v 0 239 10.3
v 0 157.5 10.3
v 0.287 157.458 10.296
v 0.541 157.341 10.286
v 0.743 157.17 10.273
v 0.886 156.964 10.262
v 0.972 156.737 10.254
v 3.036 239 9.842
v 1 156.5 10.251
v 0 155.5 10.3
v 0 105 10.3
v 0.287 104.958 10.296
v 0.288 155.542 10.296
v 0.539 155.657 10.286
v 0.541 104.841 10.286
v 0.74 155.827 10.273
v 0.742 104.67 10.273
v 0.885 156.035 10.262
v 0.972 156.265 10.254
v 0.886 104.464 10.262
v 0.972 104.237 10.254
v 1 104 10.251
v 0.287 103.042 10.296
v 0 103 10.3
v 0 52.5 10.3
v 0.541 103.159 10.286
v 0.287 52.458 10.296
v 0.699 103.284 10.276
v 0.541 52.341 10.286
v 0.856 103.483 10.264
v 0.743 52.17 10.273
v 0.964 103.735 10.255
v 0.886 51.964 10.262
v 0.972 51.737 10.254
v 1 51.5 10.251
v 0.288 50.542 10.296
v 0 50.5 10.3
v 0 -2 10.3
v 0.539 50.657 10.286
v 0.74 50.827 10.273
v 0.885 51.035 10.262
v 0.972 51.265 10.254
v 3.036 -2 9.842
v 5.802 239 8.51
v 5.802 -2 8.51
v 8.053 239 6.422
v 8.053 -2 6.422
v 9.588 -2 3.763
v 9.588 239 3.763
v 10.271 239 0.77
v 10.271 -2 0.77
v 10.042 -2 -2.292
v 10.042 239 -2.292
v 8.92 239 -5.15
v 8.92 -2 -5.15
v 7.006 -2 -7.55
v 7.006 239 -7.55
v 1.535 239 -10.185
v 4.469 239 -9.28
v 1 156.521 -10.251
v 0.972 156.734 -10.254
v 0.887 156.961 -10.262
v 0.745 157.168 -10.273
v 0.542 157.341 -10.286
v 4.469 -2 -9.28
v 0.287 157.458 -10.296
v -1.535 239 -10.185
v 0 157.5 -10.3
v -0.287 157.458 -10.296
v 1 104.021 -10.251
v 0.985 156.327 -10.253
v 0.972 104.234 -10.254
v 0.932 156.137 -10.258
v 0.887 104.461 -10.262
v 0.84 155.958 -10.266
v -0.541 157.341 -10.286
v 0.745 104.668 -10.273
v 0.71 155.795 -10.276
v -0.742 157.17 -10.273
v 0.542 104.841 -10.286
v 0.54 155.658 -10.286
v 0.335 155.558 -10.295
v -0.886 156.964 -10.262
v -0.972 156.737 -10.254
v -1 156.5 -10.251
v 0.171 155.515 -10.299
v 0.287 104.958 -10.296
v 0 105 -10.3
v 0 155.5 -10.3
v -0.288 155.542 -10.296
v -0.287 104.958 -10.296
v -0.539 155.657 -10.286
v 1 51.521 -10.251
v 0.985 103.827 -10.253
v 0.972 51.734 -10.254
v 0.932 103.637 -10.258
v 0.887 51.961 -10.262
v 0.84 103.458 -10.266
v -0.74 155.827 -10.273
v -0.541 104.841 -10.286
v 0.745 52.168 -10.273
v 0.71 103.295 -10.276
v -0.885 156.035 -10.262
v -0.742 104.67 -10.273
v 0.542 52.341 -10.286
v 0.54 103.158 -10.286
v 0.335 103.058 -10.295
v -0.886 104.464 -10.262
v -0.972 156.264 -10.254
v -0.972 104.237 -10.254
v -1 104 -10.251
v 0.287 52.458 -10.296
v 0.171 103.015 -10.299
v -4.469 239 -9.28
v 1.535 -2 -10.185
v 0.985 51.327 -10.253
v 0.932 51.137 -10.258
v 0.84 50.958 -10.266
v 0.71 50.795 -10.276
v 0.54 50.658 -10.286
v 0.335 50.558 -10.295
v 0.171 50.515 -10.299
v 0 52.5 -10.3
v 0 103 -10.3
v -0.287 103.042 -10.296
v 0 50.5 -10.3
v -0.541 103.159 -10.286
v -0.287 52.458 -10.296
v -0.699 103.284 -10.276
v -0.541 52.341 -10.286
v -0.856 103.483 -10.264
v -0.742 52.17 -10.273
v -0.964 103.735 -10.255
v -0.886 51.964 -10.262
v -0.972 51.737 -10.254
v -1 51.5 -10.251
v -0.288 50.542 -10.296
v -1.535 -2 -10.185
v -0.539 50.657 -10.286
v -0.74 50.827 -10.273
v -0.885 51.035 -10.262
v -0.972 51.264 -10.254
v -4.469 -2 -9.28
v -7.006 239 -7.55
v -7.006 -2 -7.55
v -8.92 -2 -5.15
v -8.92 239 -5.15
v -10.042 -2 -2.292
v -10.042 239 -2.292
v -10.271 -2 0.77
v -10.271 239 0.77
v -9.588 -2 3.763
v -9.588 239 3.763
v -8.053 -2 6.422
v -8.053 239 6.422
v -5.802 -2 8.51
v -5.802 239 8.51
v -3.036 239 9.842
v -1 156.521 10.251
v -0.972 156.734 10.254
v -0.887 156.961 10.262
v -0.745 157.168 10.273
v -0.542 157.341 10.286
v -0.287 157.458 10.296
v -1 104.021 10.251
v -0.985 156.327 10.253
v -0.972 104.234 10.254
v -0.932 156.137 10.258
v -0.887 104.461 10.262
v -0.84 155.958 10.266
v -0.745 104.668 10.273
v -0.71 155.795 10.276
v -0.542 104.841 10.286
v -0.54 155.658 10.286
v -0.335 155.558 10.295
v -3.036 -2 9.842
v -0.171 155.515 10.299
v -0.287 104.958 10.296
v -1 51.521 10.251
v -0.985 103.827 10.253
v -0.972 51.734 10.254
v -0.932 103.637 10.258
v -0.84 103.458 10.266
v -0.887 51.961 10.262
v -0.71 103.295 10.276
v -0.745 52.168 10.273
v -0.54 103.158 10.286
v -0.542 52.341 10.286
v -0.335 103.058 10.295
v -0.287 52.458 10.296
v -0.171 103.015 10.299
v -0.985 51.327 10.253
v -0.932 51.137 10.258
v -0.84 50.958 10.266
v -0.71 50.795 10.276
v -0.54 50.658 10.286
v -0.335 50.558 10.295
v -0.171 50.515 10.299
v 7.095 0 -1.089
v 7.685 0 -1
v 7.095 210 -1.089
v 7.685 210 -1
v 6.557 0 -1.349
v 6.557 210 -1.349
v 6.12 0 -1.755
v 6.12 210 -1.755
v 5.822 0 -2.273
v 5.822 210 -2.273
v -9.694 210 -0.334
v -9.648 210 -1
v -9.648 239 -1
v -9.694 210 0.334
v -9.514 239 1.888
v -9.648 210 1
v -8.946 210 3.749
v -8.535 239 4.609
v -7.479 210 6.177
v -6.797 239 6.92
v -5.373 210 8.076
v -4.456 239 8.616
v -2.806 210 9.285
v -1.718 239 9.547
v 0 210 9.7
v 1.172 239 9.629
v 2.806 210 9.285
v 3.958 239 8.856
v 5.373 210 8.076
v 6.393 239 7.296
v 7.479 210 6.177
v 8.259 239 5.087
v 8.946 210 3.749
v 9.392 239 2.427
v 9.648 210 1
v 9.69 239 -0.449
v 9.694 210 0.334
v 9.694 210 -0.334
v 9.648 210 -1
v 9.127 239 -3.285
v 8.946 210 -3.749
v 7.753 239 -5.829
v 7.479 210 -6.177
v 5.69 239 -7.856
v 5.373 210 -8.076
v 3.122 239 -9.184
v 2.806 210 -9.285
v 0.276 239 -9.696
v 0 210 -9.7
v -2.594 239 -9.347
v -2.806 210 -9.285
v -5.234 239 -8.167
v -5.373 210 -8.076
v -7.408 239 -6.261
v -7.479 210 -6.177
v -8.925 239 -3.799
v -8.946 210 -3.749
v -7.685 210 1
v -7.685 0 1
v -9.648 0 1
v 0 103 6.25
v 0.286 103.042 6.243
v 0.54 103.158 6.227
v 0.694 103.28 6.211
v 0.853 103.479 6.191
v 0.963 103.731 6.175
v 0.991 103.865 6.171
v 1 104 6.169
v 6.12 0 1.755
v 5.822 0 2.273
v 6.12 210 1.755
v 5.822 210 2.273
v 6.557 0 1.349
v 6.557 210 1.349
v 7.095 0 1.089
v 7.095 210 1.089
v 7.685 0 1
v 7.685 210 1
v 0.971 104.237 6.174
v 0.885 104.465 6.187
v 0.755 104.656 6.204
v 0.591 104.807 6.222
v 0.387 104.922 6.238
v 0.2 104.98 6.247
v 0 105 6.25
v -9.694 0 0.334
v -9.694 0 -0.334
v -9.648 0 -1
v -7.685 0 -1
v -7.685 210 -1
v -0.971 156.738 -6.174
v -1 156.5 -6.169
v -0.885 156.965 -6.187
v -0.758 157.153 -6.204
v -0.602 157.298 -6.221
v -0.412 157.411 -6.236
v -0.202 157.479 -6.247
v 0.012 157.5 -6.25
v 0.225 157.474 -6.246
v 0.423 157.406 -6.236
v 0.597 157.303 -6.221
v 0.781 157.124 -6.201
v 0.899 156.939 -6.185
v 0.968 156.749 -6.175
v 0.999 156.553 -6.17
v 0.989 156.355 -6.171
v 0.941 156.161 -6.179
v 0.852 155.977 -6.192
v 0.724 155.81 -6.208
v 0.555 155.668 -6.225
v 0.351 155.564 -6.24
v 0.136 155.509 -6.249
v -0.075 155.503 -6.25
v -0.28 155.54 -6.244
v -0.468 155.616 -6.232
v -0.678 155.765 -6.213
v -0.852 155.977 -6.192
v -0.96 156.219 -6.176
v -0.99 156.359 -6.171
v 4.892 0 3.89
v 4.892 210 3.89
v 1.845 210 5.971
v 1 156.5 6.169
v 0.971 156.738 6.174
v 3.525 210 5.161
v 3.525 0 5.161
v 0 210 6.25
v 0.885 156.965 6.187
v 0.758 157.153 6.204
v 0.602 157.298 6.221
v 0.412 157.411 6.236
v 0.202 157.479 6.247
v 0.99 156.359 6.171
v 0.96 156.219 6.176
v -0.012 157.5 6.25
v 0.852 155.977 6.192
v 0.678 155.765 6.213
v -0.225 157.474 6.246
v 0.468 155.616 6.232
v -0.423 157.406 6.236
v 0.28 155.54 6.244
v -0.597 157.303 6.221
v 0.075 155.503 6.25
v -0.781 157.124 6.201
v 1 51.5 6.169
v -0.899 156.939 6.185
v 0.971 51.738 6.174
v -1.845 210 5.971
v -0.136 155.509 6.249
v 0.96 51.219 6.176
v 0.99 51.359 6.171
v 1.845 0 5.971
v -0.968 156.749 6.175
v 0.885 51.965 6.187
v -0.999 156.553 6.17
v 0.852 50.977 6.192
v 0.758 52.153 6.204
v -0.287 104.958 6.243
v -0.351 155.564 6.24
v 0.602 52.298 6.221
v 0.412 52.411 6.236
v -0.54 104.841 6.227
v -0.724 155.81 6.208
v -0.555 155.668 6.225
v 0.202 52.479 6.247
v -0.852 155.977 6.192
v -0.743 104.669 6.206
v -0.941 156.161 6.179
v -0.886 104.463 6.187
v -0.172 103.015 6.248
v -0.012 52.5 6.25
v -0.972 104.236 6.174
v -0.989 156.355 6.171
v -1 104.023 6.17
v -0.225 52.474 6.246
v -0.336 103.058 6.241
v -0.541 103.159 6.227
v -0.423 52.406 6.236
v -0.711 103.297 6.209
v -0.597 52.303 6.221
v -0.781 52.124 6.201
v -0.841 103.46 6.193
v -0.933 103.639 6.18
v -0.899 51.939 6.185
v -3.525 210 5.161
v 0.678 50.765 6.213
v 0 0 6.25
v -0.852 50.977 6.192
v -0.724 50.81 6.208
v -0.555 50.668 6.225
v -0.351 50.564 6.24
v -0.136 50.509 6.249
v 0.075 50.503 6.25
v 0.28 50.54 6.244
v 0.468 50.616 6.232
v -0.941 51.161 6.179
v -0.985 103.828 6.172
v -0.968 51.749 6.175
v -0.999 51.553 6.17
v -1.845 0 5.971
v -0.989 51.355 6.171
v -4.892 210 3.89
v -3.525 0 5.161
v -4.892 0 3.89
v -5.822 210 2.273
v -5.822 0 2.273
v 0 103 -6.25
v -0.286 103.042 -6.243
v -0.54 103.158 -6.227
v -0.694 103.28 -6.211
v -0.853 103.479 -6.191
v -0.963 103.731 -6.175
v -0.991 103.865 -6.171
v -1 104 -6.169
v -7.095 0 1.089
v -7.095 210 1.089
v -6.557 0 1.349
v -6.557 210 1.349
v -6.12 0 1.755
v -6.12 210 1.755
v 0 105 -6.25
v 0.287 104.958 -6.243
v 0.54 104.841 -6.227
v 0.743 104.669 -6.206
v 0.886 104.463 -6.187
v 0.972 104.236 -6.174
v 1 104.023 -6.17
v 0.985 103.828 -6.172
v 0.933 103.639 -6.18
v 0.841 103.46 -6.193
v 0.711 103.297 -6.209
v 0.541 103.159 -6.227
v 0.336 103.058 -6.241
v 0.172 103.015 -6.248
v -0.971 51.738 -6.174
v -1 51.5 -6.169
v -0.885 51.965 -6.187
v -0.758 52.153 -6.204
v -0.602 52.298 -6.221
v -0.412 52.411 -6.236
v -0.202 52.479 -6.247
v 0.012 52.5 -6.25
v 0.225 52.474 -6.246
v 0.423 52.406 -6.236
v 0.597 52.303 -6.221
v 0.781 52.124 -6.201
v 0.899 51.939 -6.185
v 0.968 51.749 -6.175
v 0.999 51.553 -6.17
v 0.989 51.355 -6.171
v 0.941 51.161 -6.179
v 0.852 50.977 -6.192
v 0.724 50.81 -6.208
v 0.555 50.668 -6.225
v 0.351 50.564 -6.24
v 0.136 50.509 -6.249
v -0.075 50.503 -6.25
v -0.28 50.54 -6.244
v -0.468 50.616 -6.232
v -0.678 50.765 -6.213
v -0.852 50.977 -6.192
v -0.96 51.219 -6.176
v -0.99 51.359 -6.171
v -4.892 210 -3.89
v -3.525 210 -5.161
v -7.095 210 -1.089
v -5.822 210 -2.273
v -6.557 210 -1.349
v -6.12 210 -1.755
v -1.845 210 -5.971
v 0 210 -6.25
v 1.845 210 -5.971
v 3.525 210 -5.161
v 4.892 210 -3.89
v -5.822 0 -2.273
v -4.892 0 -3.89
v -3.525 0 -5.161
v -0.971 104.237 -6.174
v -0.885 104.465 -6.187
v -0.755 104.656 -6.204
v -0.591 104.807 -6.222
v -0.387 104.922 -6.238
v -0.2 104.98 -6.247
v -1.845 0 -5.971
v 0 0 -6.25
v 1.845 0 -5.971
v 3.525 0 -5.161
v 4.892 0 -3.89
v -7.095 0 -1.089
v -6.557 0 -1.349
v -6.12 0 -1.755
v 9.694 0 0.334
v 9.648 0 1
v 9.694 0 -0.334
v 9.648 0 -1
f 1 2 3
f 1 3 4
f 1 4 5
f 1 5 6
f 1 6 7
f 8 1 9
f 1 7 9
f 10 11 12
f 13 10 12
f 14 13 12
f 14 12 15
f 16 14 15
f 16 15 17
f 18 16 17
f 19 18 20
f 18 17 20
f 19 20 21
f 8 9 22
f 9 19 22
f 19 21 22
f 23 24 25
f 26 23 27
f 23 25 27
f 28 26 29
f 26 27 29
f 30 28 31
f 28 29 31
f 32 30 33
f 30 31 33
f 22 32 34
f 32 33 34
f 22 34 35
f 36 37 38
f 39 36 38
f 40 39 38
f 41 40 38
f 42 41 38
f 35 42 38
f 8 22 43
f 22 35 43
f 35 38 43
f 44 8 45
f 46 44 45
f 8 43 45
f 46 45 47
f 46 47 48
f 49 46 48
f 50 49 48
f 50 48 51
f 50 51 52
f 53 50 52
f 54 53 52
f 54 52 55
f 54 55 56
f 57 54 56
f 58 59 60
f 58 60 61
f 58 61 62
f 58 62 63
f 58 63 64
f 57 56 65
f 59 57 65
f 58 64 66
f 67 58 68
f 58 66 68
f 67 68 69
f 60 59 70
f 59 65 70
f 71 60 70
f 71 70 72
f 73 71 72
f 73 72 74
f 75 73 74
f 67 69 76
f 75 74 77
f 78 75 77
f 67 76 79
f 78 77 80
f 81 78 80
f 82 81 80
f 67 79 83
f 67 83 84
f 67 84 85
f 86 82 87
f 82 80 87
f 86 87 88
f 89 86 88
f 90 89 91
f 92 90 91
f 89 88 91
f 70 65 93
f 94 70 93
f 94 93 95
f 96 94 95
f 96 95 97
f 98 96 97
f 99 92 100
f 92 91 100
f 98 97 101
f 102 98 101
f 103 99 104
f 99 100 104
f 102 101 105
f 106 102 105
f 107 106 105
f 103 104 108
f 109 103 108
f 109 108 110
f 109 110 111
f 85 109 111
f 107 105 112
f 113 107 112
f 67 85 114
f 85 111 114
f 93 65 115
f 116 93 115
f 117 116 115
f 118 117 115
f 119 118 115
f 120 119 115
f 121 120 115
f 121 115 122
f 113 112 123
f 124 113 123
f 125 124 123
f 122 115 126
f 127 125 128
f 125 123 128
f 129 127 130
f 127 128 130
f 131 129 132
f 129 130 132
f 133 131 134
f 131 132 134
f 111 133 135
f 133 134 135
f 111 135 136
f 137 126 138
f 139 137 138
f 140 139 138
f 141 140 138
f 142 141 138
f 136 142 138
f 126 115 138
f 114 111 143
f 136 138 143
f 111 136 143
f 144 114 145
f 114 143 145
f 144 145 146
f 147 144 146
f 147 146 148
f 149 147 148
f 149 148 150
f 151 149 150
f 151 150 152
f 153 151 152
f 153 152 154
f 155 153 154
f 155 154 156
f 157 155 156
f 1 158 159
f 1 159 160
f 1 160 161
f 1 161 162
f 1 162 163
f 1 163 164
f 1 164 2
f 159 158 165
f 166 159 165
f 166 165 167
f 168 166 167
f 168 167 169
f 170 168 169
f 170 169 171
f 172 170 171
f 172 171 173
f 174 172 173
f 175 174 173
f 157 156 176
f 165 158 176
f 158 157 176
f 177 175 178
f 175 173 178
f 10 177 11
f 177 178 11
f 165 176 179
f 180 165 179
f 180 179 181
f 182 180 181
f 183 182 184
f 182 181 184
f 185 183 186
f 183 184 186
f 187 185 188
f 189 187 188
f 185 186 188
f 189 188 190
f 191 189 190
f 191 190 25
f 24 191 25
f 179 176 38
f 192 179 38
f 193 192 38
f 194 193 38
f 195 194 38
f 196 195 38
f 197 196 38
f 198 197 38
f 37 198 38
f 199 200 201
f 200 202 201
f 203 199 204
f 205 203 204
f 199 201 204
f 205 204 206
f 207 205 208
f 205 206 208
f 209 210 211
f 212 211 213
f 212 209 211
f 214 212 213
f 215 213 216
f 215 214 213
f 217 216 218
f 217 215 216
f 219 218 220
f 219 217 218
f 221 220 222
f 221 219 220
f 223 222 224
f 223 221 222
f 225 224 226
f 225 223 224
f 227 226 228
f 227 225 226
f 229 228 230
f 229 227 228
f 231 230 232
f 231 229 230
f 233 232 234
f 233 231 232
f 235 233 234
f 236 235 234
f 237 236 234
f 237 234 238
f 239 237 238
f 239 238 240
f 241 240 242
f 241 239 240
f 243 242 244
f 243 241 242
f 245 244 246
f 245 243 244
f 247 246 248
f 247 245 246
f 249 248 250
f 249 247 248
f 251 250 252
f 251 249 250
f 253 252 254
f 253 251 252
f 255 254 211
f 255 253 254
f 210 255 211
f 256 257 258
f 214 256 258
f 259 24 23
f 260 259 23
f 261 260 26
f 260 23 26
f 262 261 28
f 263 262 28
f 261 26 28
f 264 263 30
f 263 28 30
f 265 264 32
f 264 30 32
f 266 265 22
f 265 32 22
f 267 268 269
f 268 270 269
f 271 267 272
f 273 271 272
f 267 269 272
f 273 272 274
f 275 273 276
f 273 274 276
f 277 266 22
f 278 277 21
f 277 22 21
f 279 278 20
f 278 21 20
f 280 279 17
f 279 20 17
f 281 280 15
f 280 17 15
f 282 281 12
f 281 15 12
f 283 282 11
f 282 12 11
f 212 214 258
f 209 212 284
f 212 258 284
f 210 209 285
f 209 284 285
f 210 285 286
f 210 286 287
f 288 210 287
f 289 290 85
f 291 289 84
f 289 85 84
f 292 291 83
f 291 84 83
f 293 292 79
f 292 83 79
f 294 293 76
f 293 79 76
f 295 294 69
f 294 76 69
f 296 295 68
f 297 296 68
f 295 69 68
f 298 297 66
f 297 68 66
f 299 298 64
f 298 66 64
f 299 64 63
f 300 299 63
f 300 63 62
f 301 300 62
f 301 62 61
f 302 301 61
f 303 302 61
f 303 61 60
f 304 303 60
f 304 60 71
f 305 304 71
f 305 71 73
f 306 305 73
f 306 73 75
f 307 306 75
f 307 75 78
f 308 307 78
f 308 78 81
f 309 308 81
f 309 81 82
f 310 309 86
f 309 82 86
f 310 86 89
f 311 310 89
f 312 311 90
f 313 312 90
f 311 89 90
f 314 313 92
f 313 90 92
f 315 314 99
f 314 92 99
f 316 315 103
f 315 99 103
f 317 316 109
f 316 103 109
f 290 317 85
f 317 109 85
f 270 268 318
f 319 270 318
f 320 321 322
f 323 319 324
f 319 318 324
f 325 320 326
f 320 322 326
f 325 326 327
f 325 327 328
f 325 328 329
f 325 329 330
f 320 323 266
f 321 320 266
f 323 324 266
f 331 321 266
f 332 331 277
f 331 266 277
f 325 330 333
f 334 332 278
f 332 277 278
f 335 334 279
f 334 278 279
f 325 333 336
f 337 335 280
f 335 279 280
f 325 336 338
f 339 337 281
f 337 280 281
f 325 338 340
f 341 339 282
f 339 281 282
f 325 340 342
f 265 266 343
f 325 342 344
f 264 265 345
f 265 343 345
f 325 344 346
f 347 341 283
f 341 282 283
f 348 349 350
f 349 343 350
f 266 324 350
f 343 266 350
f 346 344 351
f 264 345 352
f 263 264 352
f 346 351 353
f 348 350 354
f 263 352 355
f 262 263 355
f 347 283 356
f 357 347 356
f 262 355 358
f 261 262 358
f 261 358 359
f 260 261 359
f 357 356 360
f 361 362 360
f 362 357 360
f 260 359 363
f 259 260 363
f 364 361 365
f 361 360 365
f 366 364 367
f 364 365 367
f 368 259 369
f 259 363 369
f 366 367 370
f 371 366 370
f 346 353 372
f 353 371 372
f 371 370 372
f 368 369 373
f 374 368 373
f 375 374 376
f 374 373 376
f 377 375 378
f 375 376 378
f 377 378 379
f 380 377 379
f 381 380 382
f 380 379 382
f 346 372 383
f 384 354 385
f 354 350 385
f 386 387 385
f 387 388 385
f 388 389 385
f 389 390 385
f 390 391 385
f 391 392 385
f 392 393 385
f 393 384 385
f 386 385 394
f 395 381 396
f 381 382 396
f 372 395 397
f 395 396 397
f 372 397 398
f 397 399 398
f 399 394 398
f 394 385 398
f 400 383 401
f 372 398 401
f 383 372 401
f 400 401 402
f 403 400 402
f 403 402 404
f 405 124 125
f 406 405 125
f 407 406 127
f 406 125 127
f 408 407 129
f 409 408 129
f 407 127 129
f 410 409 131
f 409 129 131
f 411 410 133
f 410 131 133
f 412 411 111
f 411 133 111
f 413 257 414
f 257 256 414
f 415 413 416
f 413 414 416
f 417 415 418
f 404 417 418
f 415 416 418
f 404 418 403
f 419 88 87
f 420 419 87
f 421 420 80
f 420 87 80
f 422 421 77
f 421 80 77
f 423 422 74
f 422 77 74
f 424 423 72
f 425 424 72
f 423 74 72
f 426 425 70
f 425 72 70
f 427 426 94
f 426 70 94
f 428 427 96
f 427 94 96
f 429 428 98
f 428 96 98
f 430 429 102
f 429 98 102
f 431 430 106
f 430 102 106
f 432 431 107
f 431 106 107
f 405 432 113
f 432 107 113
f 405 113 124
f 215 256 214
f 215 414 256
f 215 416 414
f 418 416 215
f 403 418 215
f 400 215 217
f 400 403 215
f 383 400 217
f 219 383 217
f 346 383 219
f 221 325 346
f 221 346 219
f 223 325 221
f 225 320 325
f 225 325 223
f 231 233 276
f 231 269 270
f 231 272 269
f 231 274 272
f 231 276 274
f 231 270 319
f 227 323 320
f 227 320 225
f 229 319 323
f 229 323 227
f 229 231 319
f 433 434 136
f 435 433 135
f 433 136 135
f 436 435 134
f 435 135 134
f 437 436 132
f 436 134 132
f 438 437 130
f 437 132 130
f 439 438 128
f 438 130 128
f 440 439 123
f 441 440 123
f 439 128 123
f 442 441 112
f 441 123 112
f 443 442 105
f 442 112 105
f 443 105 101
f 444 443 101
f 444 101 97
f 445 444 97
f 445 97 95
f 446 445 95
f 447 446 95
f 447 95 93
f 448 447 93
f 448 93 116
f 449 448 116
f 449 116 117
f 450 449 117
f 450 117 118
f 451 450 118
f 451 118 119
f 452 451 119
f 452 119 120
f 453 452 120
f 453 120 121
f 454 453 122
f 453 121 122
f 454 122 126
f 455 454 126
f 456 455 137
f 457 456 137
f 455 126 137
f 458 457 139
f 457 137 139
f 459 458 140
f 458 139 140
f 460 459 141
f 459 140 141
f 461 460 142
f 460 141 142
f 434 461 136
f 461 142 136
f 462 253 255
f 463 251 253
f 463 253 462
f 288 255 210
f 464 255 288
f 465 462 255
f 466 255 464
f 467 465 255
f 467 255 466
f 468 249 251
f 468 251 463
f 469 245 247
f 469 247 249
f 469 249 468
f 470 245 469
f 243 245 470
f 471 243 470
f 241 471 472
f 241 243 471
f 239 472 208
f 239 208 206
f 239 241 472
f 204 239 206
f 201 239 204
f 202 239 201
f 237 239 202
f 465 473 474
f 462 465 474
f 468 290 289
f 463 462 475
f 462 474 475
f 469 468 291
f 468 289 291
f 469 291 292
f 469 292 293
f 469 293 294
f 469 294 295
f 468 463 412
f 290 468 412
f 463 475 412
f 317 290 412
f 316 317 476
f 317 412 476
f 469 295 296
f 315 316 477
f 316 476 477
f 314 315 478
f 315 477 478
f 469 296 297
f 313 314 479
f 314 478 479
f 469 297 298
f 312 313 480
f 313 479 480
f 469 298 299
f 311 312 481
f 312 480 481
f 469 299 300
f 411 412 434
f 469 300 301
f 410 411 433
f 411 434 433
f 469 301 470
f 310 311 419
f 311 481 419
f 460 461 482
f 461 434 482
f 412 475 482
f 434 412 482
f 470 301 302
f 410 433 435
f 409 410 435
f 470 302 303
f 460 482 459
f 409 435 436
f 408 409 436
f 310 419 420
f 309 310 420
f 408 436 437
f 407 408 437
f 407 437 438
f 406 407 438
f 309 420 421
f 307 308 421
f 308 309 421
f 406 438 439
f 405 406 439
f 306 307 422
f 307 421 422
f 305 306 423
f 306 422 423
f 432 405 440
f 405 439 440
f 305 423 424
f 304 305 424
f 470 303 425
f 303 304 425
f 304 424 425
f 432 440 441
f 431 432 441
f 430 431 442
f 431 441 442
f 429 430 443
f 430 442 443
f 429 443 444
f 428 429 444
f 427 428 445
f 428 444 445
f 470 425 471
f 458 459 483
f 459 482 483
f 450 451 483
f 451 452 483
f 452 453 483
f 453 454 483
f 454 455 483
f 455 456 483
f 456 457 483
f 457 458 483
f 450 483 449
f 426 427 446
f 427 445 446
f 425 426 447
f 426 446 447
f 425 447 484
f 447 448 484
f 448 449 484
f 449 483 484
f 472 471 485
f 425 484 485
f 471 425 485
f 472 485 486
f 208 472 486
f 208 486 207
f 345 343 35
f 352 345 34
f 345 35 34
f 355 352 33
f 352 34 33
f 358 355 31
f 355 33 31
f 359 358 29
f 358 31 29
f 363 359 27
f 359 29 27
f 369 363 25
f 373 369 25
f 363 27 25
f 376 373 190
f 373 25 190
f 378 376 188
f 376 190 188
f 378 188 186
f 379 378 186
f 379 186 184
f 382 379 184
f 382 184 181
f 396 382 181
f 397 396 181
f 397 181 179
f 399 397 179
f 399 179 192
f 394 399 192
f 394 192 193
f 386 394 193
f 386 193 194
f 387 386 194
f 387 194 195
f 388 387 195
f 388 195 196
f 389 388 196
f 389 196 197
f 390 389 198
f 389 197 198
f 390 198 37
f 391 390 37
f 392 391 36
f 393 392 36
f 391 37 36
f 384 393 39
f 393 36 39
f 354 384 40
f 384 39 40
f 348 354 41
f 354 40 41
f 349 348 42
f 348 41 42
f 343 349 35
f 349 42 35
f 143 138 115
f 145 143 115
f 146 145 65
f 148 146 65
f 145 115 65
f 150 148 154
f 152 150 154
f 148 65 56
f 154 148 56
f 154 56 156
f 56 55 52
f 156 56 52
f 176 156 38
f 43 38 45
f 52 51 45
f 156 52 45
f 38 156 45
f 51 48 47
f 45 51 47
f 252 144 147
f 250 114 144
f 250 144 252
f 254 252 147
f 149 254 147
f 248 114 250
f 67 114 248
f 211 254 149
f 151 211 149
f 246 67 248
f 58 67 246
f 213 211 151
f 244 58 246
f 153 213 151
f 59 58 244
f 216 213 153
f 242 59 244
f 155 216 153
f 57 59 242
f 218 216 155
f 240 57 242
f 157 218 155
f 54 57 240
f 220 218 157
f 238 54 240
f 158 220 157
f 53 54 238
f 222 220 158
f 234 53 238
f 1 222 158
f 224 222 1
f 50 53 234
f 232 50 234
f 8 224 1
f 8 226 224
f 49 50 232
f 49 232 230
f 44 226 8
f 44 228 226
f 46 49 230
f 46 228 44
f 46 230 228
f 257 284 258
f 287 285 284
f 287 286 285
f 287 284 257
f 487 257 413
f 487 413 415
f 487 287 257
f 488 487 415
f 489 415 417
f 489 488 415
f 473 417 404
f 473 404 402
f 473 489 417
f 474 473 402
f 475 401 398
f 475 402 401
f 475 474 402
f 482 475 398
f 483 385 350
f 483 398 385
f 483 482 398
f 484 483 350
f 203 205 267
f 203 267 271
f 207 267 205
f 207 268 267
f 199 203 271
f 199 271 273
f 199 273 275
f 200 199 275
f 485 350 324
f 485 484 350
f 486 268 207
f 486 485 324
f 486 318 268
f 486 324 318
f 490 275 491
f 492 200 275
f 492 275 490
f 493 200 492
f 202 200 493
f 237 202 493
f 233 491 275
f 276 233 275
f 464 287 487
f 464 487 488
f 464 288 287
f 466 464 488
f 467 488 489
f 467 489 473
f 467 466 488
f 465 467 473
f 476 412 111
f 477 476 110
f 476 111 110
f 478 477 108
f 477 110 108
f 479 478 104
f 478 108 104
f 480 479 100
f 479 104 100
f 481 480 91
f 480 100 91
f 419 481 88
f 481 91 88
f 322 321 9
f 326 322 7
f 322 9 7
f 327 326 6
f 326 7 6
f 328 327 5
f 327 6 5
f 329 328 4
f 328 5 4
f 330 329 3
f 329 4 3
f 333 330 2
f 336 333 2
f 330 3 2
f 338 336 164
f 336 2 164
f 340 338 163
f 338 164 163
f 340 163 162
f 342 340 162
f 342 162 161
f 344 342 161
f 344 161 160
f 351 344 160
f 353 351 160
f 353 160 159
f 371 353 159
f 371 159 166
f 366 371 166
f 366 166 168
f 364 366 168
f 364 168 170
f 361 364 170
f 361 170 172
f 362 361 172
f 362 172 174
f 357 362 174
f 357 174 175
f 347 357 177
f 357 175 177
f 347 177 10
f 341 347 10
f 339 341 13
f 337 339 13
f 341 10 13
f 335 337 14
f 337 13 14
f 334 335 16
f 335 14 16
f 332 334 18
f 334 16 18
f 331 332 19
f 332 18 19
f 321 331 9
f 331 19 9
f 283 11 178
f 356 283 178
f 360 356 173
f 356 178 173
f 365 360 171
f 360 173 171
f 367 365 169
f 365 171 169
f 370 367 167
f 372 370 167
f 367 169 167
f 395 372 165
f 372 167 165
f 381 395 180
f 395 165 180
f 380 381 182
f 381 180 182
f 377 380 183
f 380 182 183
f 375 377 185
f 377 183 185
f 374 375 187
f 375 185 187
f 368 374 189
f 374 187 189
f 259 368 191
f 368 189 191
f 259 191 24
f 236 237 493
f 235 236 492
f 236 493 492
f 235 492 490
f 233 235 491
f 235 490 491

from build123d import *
from build123d.topology import SkipClean

# Parameters (mm, degrees)
SKETCH1_R               = 10.3
BOSS_EXTRUDE1_DEPTH     = 210
BOSS_EXTRUDE3_START     = -2
SKETCH1_4_R             = 10.3
SKETCH1_4_R_2           = 9.7
SKETCH1_4_R_3           = 6.25
BOSS_EXTRUDE3_DEPTH     = 2
BOSS_EXTRUDE2_START     = 210
SKETCH1_3_R             = 10.3
SKETCH1_3_R_2           = 9.7
BOSS_EXTRUDE2_DEPTH     = 29
FILLET1_R               = 2
CUT_EXTRUDE1_REACH      = 242.107
CUT_EXTRUDE1_END_RADIUS = 6.25
SKETCH3_R               = 1
CIRPATTERN1_COUNT       = 2


with BuildPart() as part:
    # Sketch1 → Boss-Extrude1 (new body)
    with BuildSketch(Plane(origin=(0, 0, 0), x_dir=(1, 0, 0), z_dir=(0, 1, 0))):
        with Locations(Location((0, 0, 0), (0, 0, 270))):
            Circle(SKETCH1_R)
        with BuildLine():
            Line((6.16948134, 1), (9.648315915, 1))
            ThreePointArc((9.648315915, 1), (9.7, 0), (9.648315915, -1))
            Line((9.648315915, -1), (6.16948134, -1))
            ThreePointArc((6.16948134, -1), (0, -6.25), (-6.16948134, -1))
            Line((-6.16948134, -1), (-9.648315915, -1))
            ThreePointArc((-9.648315915, -1), (-9.7, 0), (-9.648315915, 1))
            Line((-9.648315915, 1), (-6.16948134, 1))
            ThreePointArc((-6.16948134, 1), (0, 6.25), (6.16948134, 1))
        make_face(mode=Mode.SUBTRACT)
    extrude(amount=BOSS_EXTRUDE1_DEPTH)

    # Sketch1<4> → Boss-Extrude3 (add)
    # profile 1 of 6: a face of its own
    with BuildSketch(Plane(origin=(0, 0, 0), x_dir=(1, 0, 0), z_dir=(0, 1, 0)).offset(BOSS_EXTRUDE3_START)):
        with Locations(Location((0, 0, 0), (0, 0, 270))):
            Circle(SKETCH1_4_R)
        Circle(SKETCH1_4_R_2, mode=Mode.SUBTRACT)
    # profile 2 of 6: a face of its own
    with BuildSketch(Plane(origin=(0, 0, 0), x_dir=(1, 0, 0), z_dir=(0, 1, 0)).offset(BOSS_EXTRUDE3_START)):
        with BuildLine():
            ThreePointArc((9.648315915, 1), (0, 9.7), (-9.648315915, 1))
            Line((-9.648315915, 1), (-6.16948134, 1))
            ThreePointArc((-6.16948134, 1), (0, 6.25), (6.16948134, 1))
            Line((6.16948134, 1), (9.648315915, 1))
        make_face()
    # profile 3 of 6: a face of its own
    with BuildSketch(Plane(origin=(0, 0, 0), x_dir=(1, 0, 0), z_dir=(0, 1, 0)).offset(BOSS_EXTRUDE3_START)):
        with BuildLine():
            ThreePointArc((9.7, 0), (9.687070362, 0.500667366), (9.648315915, 1))
            Line((9.648315915, 1), (6.16948134, 1))
            ThreePointArc((6.16948134, 1), (6.229837814, 0.501618195), (6.25, 0))
            ThreePointArc((6.25, 0), (6.229837814, -0.501618195), (6.16948134, -1))
            Line((6.16948134, -1), (9.648315915, -1))
            ThreePointArc((9.648315915, -1), (9.687070362, -0.500667366), (9.7, 0))
        make_face()
    # profile 4 of 6: a face of its own
    with BuildSketch(Plane(origin=(0, 0, 0), x_dir=(1, 0, 0), z_dir=(0, 1, 0)).offset(BOSS_EXTRUDE3_START)):
        with BuildLine():
            Line((-6.16948134, -1), (-9.648315915, -1))
            ThreePointArc((-9.648315915, -1), (0, -9.7), (9.648315915, -1))
            Line((9.648315915, -1), (6.16948134, -1))
            ThreePointArc((6.16948134, -1), (0, -6.25), (-6.16948134, -1))
        make_face()
    # profile 5 of 6: a face of its own
    with BuildSketch(Plane(origin=(0, 0, 0), x_dir=(1, 0, 0), z_dir=(0, 1, 0)).offset(BOSS_EXTRUDE3_START)):
        Circle(SKETCH1_4_R_3)
    # profile 6 of 6: a face of its own
    with BuildSketch(Plane(origin=(0, 0, 0), x_dir=(1, 0, 0), z_dir=(0, 1, 0)).offset(BOSS_EXTRUDE3_START)):
        with BuildLine():
            Line((-6.16948134, 1), (-9.648315915, 1))
            ThreePointArc((-9.648315915, 1), (-9.7, 0), (-9.648315915, -1))
            Line((-9.648315915, -1), (-6.16948134, -1))
            ThreePointArc((-6.16948134, -1), (-6.25, 0), (-6.16948134, 1))
        make_face()
    extrude(amount=BOSS_EXTRUDE3_DEPTH)

    # Sketch1<3> → Boss-Extrude2 (add)
    with SkipClean():  # the faces are left unmerged after this step: merging them gives an invalid solid
        with BuildSketch(Plane(origin=(0, 0, 0), x_dir=(1, 0, 0), z_dir=(0, 1, 0)).offset(BOSS_EXTRUDE2_START)):
            with Locations(Location((0, 0, 0), (0, 0, 270))):
                Circle(SKETCH1_3_R)
            with Locations(Location((0, 0, 0), (0, 0, 174.082705248))):
                Circle(SKETCH1_3_R_2, mode=Mode.SUBTRACT)
        extrude(amount=BOSS_EXTRUDE2_DEPTH)

    # Fillet1
    fillet1_edges = [part.edges().sort_by_distance(p)[0] for p in [
        (6.16948134, 105, 1),
        (6.16948134, 105, -1),
        (-6.16948134, 105, -1),
        (-6.16948134, 105, 1),
    ]]
    fillet(fillet1_edges, radius=FILLET1_R)

    # Cut-Extrude1: up to this cylinder (the profile starts outside it)
    with SkipClean():  # the faces are left unmerged after this step: merging them gives an invalid solid
        cut_extrude1_end = Plane(origin=(0, 104, 0), z_dir=(0, -1, 0)) * Cylinder(CUT_EXTRUDE1_END_RADIUS, 602.714, mode=Mode.PRIVATE)
        # Sketch3 → Cut-Extrude1 (cut, up to the surface)
        with BuildSketch(Plane.XY.offset(10.3), mode=Mode.PRIVATE) as cut_extrude1_sk1:
            with BuildLine():
                ThreePointArc((1, 104), (0.707106781, 104.707106781), (0, 105))
                Line((0, 105), (0, 103))
                ThreePointArc((0, 103), (0.707106781, 103.292893219), (1, 104))
            make_face()
        cut_extrude1_tool1 = extrude(cut_extrude1_sk1.sketch, amount=-CUT_EXTRUDE1_REACH, mode=Mode.PRIVATE) - cut_extrude1_end
        # Sketch3 → Cut-Extrude1 (cut, up to the surface)
        with BuildSketch(Plane.XY.offset(10.3), mode=Mode.PRIVATE) as cut_extrude1_sk2:
            with BuildLine():
                Line((0, 103), (0, 105))
                ThreePointArc((0, 105), (-1, 104), (0, 103))
            make_face()
        cut_extrude1_tool2 = extrude(cut_extrude1_sk2.sketch, amount=-CUT_EXTRUDE1_REACH, mode=Mode.PRIVATE) - cut_extrude1_end
        # Sketch3 → Cut-Extrude1 (cut, up to the surface)
        with BuildSketch(Plane.XY.offset(10.3), mode=Mode.PRIVATE) as cut_extrude1_sk3:
            with BuildLine():
                ThreePointArc((1, 104), (0.707106781, 104.707106781), (0, 105))
                Line((0, 105), (0, 103))
                ThreePointArc((0, 103), (0.707106781, 103.292893219), (1, 104))
            make_face()
        cut_extrude1_tool3 = extrude(cut_extrude1_sk3.sketch, amount=-CUT_EXTRUDE1_REACH, mode=Mode.PRIVATE) - cut_extrude1_end
        # Sketch3 → Cut-Extrude1 (cut, up to the surface)
        with BuildSketch(Plane.XY.offset(10.3), mode=Mode.PRIVATE) as cut_extrude1_sk4:
            with BuildLine():
                Line((0, 103), (0, 105))
                ThreePointArc((0, 105), (-1, 104), (0, 103))
            make_face()
        cut_extrude1_tool4 = extrude(cut_extrude1_sk4.sketch, amount=-CUT_EXTRUDE1_REACH, mode=Mode.PRIVATE) - cut_extrude1_end
        # Sketch3 → Cut-Extrude1 (cut, up to the surface)
        with BuildSketch(Plane.XY.offset(10.3), mode=Mode.PRIVATE) as cut_extrude1_sk5:
            with Locations((0, 156.5)):
                Circle(SKETCH3_R)
        cut_extrude1_tool5 = extrude(cut_extrude1_sk5.sketch, amount=-CUT_EXTRUDE1_REACH, mode=Mode.PRIVATE) - cut_extrude1_end
        # Sketch3 → Cut-Extrude1 (cut, up to the surface)
        with BuildSketch(Plane.XY.offset(10.3), mode=Mode.PRIVATE) as cut_extrude1_sk6:
            with Locations((0, 51.5)):
                Circle(SKETCH3_R)
        cut_extrude1_tool6 = extrude(cut_extrude1_sk6.sketch, amount=-CUT_EXTRUDE1_REACH, mode=Mode.PRIVATE) - cut_extrude1_end
        cut_extrude1 = cut_extrude1_tool1.solids().sort_by_distance((0.424413, 104, 10.3))[0] + cut_extrude1_tool2.solids().sort_by_distance((-0.424413, 104, 10.3))[0] + cut_extrude1_tool3.solids().sort_by_distance((0.424413, 104, 10.3))[0] + cut_extrude1_tool4.solids().sort_by_distance((-0.424413, 104, 10.3))[0] + cut_extrude1_tool5.solids().sort_by_distance((0, 156.5, 10.3))[0] + cut_extrude1_tool6.solids().sort_by_distance((0, 51.5, 10.3))[0]
        add(cut_extrude1, mode=Mode.SUBTRACT)

    # CirPattern1: Cut-Extrude1 ×2 about axis
    with SkipClean():  # the faces are left unmerged after this step: merging them gives an invalid solid
        cirpattern1_axis = Axis((0, 210, 0), (0, -1, 0))
        for i in range(1, CIRPATTERN1_COUNT):
            add(cut_extrude1.rotate(cirpattern1_axis, i * 360 / CIRPATTERN1_COUNT), mode=Mode.SUBTRACT)


solid = part.part
